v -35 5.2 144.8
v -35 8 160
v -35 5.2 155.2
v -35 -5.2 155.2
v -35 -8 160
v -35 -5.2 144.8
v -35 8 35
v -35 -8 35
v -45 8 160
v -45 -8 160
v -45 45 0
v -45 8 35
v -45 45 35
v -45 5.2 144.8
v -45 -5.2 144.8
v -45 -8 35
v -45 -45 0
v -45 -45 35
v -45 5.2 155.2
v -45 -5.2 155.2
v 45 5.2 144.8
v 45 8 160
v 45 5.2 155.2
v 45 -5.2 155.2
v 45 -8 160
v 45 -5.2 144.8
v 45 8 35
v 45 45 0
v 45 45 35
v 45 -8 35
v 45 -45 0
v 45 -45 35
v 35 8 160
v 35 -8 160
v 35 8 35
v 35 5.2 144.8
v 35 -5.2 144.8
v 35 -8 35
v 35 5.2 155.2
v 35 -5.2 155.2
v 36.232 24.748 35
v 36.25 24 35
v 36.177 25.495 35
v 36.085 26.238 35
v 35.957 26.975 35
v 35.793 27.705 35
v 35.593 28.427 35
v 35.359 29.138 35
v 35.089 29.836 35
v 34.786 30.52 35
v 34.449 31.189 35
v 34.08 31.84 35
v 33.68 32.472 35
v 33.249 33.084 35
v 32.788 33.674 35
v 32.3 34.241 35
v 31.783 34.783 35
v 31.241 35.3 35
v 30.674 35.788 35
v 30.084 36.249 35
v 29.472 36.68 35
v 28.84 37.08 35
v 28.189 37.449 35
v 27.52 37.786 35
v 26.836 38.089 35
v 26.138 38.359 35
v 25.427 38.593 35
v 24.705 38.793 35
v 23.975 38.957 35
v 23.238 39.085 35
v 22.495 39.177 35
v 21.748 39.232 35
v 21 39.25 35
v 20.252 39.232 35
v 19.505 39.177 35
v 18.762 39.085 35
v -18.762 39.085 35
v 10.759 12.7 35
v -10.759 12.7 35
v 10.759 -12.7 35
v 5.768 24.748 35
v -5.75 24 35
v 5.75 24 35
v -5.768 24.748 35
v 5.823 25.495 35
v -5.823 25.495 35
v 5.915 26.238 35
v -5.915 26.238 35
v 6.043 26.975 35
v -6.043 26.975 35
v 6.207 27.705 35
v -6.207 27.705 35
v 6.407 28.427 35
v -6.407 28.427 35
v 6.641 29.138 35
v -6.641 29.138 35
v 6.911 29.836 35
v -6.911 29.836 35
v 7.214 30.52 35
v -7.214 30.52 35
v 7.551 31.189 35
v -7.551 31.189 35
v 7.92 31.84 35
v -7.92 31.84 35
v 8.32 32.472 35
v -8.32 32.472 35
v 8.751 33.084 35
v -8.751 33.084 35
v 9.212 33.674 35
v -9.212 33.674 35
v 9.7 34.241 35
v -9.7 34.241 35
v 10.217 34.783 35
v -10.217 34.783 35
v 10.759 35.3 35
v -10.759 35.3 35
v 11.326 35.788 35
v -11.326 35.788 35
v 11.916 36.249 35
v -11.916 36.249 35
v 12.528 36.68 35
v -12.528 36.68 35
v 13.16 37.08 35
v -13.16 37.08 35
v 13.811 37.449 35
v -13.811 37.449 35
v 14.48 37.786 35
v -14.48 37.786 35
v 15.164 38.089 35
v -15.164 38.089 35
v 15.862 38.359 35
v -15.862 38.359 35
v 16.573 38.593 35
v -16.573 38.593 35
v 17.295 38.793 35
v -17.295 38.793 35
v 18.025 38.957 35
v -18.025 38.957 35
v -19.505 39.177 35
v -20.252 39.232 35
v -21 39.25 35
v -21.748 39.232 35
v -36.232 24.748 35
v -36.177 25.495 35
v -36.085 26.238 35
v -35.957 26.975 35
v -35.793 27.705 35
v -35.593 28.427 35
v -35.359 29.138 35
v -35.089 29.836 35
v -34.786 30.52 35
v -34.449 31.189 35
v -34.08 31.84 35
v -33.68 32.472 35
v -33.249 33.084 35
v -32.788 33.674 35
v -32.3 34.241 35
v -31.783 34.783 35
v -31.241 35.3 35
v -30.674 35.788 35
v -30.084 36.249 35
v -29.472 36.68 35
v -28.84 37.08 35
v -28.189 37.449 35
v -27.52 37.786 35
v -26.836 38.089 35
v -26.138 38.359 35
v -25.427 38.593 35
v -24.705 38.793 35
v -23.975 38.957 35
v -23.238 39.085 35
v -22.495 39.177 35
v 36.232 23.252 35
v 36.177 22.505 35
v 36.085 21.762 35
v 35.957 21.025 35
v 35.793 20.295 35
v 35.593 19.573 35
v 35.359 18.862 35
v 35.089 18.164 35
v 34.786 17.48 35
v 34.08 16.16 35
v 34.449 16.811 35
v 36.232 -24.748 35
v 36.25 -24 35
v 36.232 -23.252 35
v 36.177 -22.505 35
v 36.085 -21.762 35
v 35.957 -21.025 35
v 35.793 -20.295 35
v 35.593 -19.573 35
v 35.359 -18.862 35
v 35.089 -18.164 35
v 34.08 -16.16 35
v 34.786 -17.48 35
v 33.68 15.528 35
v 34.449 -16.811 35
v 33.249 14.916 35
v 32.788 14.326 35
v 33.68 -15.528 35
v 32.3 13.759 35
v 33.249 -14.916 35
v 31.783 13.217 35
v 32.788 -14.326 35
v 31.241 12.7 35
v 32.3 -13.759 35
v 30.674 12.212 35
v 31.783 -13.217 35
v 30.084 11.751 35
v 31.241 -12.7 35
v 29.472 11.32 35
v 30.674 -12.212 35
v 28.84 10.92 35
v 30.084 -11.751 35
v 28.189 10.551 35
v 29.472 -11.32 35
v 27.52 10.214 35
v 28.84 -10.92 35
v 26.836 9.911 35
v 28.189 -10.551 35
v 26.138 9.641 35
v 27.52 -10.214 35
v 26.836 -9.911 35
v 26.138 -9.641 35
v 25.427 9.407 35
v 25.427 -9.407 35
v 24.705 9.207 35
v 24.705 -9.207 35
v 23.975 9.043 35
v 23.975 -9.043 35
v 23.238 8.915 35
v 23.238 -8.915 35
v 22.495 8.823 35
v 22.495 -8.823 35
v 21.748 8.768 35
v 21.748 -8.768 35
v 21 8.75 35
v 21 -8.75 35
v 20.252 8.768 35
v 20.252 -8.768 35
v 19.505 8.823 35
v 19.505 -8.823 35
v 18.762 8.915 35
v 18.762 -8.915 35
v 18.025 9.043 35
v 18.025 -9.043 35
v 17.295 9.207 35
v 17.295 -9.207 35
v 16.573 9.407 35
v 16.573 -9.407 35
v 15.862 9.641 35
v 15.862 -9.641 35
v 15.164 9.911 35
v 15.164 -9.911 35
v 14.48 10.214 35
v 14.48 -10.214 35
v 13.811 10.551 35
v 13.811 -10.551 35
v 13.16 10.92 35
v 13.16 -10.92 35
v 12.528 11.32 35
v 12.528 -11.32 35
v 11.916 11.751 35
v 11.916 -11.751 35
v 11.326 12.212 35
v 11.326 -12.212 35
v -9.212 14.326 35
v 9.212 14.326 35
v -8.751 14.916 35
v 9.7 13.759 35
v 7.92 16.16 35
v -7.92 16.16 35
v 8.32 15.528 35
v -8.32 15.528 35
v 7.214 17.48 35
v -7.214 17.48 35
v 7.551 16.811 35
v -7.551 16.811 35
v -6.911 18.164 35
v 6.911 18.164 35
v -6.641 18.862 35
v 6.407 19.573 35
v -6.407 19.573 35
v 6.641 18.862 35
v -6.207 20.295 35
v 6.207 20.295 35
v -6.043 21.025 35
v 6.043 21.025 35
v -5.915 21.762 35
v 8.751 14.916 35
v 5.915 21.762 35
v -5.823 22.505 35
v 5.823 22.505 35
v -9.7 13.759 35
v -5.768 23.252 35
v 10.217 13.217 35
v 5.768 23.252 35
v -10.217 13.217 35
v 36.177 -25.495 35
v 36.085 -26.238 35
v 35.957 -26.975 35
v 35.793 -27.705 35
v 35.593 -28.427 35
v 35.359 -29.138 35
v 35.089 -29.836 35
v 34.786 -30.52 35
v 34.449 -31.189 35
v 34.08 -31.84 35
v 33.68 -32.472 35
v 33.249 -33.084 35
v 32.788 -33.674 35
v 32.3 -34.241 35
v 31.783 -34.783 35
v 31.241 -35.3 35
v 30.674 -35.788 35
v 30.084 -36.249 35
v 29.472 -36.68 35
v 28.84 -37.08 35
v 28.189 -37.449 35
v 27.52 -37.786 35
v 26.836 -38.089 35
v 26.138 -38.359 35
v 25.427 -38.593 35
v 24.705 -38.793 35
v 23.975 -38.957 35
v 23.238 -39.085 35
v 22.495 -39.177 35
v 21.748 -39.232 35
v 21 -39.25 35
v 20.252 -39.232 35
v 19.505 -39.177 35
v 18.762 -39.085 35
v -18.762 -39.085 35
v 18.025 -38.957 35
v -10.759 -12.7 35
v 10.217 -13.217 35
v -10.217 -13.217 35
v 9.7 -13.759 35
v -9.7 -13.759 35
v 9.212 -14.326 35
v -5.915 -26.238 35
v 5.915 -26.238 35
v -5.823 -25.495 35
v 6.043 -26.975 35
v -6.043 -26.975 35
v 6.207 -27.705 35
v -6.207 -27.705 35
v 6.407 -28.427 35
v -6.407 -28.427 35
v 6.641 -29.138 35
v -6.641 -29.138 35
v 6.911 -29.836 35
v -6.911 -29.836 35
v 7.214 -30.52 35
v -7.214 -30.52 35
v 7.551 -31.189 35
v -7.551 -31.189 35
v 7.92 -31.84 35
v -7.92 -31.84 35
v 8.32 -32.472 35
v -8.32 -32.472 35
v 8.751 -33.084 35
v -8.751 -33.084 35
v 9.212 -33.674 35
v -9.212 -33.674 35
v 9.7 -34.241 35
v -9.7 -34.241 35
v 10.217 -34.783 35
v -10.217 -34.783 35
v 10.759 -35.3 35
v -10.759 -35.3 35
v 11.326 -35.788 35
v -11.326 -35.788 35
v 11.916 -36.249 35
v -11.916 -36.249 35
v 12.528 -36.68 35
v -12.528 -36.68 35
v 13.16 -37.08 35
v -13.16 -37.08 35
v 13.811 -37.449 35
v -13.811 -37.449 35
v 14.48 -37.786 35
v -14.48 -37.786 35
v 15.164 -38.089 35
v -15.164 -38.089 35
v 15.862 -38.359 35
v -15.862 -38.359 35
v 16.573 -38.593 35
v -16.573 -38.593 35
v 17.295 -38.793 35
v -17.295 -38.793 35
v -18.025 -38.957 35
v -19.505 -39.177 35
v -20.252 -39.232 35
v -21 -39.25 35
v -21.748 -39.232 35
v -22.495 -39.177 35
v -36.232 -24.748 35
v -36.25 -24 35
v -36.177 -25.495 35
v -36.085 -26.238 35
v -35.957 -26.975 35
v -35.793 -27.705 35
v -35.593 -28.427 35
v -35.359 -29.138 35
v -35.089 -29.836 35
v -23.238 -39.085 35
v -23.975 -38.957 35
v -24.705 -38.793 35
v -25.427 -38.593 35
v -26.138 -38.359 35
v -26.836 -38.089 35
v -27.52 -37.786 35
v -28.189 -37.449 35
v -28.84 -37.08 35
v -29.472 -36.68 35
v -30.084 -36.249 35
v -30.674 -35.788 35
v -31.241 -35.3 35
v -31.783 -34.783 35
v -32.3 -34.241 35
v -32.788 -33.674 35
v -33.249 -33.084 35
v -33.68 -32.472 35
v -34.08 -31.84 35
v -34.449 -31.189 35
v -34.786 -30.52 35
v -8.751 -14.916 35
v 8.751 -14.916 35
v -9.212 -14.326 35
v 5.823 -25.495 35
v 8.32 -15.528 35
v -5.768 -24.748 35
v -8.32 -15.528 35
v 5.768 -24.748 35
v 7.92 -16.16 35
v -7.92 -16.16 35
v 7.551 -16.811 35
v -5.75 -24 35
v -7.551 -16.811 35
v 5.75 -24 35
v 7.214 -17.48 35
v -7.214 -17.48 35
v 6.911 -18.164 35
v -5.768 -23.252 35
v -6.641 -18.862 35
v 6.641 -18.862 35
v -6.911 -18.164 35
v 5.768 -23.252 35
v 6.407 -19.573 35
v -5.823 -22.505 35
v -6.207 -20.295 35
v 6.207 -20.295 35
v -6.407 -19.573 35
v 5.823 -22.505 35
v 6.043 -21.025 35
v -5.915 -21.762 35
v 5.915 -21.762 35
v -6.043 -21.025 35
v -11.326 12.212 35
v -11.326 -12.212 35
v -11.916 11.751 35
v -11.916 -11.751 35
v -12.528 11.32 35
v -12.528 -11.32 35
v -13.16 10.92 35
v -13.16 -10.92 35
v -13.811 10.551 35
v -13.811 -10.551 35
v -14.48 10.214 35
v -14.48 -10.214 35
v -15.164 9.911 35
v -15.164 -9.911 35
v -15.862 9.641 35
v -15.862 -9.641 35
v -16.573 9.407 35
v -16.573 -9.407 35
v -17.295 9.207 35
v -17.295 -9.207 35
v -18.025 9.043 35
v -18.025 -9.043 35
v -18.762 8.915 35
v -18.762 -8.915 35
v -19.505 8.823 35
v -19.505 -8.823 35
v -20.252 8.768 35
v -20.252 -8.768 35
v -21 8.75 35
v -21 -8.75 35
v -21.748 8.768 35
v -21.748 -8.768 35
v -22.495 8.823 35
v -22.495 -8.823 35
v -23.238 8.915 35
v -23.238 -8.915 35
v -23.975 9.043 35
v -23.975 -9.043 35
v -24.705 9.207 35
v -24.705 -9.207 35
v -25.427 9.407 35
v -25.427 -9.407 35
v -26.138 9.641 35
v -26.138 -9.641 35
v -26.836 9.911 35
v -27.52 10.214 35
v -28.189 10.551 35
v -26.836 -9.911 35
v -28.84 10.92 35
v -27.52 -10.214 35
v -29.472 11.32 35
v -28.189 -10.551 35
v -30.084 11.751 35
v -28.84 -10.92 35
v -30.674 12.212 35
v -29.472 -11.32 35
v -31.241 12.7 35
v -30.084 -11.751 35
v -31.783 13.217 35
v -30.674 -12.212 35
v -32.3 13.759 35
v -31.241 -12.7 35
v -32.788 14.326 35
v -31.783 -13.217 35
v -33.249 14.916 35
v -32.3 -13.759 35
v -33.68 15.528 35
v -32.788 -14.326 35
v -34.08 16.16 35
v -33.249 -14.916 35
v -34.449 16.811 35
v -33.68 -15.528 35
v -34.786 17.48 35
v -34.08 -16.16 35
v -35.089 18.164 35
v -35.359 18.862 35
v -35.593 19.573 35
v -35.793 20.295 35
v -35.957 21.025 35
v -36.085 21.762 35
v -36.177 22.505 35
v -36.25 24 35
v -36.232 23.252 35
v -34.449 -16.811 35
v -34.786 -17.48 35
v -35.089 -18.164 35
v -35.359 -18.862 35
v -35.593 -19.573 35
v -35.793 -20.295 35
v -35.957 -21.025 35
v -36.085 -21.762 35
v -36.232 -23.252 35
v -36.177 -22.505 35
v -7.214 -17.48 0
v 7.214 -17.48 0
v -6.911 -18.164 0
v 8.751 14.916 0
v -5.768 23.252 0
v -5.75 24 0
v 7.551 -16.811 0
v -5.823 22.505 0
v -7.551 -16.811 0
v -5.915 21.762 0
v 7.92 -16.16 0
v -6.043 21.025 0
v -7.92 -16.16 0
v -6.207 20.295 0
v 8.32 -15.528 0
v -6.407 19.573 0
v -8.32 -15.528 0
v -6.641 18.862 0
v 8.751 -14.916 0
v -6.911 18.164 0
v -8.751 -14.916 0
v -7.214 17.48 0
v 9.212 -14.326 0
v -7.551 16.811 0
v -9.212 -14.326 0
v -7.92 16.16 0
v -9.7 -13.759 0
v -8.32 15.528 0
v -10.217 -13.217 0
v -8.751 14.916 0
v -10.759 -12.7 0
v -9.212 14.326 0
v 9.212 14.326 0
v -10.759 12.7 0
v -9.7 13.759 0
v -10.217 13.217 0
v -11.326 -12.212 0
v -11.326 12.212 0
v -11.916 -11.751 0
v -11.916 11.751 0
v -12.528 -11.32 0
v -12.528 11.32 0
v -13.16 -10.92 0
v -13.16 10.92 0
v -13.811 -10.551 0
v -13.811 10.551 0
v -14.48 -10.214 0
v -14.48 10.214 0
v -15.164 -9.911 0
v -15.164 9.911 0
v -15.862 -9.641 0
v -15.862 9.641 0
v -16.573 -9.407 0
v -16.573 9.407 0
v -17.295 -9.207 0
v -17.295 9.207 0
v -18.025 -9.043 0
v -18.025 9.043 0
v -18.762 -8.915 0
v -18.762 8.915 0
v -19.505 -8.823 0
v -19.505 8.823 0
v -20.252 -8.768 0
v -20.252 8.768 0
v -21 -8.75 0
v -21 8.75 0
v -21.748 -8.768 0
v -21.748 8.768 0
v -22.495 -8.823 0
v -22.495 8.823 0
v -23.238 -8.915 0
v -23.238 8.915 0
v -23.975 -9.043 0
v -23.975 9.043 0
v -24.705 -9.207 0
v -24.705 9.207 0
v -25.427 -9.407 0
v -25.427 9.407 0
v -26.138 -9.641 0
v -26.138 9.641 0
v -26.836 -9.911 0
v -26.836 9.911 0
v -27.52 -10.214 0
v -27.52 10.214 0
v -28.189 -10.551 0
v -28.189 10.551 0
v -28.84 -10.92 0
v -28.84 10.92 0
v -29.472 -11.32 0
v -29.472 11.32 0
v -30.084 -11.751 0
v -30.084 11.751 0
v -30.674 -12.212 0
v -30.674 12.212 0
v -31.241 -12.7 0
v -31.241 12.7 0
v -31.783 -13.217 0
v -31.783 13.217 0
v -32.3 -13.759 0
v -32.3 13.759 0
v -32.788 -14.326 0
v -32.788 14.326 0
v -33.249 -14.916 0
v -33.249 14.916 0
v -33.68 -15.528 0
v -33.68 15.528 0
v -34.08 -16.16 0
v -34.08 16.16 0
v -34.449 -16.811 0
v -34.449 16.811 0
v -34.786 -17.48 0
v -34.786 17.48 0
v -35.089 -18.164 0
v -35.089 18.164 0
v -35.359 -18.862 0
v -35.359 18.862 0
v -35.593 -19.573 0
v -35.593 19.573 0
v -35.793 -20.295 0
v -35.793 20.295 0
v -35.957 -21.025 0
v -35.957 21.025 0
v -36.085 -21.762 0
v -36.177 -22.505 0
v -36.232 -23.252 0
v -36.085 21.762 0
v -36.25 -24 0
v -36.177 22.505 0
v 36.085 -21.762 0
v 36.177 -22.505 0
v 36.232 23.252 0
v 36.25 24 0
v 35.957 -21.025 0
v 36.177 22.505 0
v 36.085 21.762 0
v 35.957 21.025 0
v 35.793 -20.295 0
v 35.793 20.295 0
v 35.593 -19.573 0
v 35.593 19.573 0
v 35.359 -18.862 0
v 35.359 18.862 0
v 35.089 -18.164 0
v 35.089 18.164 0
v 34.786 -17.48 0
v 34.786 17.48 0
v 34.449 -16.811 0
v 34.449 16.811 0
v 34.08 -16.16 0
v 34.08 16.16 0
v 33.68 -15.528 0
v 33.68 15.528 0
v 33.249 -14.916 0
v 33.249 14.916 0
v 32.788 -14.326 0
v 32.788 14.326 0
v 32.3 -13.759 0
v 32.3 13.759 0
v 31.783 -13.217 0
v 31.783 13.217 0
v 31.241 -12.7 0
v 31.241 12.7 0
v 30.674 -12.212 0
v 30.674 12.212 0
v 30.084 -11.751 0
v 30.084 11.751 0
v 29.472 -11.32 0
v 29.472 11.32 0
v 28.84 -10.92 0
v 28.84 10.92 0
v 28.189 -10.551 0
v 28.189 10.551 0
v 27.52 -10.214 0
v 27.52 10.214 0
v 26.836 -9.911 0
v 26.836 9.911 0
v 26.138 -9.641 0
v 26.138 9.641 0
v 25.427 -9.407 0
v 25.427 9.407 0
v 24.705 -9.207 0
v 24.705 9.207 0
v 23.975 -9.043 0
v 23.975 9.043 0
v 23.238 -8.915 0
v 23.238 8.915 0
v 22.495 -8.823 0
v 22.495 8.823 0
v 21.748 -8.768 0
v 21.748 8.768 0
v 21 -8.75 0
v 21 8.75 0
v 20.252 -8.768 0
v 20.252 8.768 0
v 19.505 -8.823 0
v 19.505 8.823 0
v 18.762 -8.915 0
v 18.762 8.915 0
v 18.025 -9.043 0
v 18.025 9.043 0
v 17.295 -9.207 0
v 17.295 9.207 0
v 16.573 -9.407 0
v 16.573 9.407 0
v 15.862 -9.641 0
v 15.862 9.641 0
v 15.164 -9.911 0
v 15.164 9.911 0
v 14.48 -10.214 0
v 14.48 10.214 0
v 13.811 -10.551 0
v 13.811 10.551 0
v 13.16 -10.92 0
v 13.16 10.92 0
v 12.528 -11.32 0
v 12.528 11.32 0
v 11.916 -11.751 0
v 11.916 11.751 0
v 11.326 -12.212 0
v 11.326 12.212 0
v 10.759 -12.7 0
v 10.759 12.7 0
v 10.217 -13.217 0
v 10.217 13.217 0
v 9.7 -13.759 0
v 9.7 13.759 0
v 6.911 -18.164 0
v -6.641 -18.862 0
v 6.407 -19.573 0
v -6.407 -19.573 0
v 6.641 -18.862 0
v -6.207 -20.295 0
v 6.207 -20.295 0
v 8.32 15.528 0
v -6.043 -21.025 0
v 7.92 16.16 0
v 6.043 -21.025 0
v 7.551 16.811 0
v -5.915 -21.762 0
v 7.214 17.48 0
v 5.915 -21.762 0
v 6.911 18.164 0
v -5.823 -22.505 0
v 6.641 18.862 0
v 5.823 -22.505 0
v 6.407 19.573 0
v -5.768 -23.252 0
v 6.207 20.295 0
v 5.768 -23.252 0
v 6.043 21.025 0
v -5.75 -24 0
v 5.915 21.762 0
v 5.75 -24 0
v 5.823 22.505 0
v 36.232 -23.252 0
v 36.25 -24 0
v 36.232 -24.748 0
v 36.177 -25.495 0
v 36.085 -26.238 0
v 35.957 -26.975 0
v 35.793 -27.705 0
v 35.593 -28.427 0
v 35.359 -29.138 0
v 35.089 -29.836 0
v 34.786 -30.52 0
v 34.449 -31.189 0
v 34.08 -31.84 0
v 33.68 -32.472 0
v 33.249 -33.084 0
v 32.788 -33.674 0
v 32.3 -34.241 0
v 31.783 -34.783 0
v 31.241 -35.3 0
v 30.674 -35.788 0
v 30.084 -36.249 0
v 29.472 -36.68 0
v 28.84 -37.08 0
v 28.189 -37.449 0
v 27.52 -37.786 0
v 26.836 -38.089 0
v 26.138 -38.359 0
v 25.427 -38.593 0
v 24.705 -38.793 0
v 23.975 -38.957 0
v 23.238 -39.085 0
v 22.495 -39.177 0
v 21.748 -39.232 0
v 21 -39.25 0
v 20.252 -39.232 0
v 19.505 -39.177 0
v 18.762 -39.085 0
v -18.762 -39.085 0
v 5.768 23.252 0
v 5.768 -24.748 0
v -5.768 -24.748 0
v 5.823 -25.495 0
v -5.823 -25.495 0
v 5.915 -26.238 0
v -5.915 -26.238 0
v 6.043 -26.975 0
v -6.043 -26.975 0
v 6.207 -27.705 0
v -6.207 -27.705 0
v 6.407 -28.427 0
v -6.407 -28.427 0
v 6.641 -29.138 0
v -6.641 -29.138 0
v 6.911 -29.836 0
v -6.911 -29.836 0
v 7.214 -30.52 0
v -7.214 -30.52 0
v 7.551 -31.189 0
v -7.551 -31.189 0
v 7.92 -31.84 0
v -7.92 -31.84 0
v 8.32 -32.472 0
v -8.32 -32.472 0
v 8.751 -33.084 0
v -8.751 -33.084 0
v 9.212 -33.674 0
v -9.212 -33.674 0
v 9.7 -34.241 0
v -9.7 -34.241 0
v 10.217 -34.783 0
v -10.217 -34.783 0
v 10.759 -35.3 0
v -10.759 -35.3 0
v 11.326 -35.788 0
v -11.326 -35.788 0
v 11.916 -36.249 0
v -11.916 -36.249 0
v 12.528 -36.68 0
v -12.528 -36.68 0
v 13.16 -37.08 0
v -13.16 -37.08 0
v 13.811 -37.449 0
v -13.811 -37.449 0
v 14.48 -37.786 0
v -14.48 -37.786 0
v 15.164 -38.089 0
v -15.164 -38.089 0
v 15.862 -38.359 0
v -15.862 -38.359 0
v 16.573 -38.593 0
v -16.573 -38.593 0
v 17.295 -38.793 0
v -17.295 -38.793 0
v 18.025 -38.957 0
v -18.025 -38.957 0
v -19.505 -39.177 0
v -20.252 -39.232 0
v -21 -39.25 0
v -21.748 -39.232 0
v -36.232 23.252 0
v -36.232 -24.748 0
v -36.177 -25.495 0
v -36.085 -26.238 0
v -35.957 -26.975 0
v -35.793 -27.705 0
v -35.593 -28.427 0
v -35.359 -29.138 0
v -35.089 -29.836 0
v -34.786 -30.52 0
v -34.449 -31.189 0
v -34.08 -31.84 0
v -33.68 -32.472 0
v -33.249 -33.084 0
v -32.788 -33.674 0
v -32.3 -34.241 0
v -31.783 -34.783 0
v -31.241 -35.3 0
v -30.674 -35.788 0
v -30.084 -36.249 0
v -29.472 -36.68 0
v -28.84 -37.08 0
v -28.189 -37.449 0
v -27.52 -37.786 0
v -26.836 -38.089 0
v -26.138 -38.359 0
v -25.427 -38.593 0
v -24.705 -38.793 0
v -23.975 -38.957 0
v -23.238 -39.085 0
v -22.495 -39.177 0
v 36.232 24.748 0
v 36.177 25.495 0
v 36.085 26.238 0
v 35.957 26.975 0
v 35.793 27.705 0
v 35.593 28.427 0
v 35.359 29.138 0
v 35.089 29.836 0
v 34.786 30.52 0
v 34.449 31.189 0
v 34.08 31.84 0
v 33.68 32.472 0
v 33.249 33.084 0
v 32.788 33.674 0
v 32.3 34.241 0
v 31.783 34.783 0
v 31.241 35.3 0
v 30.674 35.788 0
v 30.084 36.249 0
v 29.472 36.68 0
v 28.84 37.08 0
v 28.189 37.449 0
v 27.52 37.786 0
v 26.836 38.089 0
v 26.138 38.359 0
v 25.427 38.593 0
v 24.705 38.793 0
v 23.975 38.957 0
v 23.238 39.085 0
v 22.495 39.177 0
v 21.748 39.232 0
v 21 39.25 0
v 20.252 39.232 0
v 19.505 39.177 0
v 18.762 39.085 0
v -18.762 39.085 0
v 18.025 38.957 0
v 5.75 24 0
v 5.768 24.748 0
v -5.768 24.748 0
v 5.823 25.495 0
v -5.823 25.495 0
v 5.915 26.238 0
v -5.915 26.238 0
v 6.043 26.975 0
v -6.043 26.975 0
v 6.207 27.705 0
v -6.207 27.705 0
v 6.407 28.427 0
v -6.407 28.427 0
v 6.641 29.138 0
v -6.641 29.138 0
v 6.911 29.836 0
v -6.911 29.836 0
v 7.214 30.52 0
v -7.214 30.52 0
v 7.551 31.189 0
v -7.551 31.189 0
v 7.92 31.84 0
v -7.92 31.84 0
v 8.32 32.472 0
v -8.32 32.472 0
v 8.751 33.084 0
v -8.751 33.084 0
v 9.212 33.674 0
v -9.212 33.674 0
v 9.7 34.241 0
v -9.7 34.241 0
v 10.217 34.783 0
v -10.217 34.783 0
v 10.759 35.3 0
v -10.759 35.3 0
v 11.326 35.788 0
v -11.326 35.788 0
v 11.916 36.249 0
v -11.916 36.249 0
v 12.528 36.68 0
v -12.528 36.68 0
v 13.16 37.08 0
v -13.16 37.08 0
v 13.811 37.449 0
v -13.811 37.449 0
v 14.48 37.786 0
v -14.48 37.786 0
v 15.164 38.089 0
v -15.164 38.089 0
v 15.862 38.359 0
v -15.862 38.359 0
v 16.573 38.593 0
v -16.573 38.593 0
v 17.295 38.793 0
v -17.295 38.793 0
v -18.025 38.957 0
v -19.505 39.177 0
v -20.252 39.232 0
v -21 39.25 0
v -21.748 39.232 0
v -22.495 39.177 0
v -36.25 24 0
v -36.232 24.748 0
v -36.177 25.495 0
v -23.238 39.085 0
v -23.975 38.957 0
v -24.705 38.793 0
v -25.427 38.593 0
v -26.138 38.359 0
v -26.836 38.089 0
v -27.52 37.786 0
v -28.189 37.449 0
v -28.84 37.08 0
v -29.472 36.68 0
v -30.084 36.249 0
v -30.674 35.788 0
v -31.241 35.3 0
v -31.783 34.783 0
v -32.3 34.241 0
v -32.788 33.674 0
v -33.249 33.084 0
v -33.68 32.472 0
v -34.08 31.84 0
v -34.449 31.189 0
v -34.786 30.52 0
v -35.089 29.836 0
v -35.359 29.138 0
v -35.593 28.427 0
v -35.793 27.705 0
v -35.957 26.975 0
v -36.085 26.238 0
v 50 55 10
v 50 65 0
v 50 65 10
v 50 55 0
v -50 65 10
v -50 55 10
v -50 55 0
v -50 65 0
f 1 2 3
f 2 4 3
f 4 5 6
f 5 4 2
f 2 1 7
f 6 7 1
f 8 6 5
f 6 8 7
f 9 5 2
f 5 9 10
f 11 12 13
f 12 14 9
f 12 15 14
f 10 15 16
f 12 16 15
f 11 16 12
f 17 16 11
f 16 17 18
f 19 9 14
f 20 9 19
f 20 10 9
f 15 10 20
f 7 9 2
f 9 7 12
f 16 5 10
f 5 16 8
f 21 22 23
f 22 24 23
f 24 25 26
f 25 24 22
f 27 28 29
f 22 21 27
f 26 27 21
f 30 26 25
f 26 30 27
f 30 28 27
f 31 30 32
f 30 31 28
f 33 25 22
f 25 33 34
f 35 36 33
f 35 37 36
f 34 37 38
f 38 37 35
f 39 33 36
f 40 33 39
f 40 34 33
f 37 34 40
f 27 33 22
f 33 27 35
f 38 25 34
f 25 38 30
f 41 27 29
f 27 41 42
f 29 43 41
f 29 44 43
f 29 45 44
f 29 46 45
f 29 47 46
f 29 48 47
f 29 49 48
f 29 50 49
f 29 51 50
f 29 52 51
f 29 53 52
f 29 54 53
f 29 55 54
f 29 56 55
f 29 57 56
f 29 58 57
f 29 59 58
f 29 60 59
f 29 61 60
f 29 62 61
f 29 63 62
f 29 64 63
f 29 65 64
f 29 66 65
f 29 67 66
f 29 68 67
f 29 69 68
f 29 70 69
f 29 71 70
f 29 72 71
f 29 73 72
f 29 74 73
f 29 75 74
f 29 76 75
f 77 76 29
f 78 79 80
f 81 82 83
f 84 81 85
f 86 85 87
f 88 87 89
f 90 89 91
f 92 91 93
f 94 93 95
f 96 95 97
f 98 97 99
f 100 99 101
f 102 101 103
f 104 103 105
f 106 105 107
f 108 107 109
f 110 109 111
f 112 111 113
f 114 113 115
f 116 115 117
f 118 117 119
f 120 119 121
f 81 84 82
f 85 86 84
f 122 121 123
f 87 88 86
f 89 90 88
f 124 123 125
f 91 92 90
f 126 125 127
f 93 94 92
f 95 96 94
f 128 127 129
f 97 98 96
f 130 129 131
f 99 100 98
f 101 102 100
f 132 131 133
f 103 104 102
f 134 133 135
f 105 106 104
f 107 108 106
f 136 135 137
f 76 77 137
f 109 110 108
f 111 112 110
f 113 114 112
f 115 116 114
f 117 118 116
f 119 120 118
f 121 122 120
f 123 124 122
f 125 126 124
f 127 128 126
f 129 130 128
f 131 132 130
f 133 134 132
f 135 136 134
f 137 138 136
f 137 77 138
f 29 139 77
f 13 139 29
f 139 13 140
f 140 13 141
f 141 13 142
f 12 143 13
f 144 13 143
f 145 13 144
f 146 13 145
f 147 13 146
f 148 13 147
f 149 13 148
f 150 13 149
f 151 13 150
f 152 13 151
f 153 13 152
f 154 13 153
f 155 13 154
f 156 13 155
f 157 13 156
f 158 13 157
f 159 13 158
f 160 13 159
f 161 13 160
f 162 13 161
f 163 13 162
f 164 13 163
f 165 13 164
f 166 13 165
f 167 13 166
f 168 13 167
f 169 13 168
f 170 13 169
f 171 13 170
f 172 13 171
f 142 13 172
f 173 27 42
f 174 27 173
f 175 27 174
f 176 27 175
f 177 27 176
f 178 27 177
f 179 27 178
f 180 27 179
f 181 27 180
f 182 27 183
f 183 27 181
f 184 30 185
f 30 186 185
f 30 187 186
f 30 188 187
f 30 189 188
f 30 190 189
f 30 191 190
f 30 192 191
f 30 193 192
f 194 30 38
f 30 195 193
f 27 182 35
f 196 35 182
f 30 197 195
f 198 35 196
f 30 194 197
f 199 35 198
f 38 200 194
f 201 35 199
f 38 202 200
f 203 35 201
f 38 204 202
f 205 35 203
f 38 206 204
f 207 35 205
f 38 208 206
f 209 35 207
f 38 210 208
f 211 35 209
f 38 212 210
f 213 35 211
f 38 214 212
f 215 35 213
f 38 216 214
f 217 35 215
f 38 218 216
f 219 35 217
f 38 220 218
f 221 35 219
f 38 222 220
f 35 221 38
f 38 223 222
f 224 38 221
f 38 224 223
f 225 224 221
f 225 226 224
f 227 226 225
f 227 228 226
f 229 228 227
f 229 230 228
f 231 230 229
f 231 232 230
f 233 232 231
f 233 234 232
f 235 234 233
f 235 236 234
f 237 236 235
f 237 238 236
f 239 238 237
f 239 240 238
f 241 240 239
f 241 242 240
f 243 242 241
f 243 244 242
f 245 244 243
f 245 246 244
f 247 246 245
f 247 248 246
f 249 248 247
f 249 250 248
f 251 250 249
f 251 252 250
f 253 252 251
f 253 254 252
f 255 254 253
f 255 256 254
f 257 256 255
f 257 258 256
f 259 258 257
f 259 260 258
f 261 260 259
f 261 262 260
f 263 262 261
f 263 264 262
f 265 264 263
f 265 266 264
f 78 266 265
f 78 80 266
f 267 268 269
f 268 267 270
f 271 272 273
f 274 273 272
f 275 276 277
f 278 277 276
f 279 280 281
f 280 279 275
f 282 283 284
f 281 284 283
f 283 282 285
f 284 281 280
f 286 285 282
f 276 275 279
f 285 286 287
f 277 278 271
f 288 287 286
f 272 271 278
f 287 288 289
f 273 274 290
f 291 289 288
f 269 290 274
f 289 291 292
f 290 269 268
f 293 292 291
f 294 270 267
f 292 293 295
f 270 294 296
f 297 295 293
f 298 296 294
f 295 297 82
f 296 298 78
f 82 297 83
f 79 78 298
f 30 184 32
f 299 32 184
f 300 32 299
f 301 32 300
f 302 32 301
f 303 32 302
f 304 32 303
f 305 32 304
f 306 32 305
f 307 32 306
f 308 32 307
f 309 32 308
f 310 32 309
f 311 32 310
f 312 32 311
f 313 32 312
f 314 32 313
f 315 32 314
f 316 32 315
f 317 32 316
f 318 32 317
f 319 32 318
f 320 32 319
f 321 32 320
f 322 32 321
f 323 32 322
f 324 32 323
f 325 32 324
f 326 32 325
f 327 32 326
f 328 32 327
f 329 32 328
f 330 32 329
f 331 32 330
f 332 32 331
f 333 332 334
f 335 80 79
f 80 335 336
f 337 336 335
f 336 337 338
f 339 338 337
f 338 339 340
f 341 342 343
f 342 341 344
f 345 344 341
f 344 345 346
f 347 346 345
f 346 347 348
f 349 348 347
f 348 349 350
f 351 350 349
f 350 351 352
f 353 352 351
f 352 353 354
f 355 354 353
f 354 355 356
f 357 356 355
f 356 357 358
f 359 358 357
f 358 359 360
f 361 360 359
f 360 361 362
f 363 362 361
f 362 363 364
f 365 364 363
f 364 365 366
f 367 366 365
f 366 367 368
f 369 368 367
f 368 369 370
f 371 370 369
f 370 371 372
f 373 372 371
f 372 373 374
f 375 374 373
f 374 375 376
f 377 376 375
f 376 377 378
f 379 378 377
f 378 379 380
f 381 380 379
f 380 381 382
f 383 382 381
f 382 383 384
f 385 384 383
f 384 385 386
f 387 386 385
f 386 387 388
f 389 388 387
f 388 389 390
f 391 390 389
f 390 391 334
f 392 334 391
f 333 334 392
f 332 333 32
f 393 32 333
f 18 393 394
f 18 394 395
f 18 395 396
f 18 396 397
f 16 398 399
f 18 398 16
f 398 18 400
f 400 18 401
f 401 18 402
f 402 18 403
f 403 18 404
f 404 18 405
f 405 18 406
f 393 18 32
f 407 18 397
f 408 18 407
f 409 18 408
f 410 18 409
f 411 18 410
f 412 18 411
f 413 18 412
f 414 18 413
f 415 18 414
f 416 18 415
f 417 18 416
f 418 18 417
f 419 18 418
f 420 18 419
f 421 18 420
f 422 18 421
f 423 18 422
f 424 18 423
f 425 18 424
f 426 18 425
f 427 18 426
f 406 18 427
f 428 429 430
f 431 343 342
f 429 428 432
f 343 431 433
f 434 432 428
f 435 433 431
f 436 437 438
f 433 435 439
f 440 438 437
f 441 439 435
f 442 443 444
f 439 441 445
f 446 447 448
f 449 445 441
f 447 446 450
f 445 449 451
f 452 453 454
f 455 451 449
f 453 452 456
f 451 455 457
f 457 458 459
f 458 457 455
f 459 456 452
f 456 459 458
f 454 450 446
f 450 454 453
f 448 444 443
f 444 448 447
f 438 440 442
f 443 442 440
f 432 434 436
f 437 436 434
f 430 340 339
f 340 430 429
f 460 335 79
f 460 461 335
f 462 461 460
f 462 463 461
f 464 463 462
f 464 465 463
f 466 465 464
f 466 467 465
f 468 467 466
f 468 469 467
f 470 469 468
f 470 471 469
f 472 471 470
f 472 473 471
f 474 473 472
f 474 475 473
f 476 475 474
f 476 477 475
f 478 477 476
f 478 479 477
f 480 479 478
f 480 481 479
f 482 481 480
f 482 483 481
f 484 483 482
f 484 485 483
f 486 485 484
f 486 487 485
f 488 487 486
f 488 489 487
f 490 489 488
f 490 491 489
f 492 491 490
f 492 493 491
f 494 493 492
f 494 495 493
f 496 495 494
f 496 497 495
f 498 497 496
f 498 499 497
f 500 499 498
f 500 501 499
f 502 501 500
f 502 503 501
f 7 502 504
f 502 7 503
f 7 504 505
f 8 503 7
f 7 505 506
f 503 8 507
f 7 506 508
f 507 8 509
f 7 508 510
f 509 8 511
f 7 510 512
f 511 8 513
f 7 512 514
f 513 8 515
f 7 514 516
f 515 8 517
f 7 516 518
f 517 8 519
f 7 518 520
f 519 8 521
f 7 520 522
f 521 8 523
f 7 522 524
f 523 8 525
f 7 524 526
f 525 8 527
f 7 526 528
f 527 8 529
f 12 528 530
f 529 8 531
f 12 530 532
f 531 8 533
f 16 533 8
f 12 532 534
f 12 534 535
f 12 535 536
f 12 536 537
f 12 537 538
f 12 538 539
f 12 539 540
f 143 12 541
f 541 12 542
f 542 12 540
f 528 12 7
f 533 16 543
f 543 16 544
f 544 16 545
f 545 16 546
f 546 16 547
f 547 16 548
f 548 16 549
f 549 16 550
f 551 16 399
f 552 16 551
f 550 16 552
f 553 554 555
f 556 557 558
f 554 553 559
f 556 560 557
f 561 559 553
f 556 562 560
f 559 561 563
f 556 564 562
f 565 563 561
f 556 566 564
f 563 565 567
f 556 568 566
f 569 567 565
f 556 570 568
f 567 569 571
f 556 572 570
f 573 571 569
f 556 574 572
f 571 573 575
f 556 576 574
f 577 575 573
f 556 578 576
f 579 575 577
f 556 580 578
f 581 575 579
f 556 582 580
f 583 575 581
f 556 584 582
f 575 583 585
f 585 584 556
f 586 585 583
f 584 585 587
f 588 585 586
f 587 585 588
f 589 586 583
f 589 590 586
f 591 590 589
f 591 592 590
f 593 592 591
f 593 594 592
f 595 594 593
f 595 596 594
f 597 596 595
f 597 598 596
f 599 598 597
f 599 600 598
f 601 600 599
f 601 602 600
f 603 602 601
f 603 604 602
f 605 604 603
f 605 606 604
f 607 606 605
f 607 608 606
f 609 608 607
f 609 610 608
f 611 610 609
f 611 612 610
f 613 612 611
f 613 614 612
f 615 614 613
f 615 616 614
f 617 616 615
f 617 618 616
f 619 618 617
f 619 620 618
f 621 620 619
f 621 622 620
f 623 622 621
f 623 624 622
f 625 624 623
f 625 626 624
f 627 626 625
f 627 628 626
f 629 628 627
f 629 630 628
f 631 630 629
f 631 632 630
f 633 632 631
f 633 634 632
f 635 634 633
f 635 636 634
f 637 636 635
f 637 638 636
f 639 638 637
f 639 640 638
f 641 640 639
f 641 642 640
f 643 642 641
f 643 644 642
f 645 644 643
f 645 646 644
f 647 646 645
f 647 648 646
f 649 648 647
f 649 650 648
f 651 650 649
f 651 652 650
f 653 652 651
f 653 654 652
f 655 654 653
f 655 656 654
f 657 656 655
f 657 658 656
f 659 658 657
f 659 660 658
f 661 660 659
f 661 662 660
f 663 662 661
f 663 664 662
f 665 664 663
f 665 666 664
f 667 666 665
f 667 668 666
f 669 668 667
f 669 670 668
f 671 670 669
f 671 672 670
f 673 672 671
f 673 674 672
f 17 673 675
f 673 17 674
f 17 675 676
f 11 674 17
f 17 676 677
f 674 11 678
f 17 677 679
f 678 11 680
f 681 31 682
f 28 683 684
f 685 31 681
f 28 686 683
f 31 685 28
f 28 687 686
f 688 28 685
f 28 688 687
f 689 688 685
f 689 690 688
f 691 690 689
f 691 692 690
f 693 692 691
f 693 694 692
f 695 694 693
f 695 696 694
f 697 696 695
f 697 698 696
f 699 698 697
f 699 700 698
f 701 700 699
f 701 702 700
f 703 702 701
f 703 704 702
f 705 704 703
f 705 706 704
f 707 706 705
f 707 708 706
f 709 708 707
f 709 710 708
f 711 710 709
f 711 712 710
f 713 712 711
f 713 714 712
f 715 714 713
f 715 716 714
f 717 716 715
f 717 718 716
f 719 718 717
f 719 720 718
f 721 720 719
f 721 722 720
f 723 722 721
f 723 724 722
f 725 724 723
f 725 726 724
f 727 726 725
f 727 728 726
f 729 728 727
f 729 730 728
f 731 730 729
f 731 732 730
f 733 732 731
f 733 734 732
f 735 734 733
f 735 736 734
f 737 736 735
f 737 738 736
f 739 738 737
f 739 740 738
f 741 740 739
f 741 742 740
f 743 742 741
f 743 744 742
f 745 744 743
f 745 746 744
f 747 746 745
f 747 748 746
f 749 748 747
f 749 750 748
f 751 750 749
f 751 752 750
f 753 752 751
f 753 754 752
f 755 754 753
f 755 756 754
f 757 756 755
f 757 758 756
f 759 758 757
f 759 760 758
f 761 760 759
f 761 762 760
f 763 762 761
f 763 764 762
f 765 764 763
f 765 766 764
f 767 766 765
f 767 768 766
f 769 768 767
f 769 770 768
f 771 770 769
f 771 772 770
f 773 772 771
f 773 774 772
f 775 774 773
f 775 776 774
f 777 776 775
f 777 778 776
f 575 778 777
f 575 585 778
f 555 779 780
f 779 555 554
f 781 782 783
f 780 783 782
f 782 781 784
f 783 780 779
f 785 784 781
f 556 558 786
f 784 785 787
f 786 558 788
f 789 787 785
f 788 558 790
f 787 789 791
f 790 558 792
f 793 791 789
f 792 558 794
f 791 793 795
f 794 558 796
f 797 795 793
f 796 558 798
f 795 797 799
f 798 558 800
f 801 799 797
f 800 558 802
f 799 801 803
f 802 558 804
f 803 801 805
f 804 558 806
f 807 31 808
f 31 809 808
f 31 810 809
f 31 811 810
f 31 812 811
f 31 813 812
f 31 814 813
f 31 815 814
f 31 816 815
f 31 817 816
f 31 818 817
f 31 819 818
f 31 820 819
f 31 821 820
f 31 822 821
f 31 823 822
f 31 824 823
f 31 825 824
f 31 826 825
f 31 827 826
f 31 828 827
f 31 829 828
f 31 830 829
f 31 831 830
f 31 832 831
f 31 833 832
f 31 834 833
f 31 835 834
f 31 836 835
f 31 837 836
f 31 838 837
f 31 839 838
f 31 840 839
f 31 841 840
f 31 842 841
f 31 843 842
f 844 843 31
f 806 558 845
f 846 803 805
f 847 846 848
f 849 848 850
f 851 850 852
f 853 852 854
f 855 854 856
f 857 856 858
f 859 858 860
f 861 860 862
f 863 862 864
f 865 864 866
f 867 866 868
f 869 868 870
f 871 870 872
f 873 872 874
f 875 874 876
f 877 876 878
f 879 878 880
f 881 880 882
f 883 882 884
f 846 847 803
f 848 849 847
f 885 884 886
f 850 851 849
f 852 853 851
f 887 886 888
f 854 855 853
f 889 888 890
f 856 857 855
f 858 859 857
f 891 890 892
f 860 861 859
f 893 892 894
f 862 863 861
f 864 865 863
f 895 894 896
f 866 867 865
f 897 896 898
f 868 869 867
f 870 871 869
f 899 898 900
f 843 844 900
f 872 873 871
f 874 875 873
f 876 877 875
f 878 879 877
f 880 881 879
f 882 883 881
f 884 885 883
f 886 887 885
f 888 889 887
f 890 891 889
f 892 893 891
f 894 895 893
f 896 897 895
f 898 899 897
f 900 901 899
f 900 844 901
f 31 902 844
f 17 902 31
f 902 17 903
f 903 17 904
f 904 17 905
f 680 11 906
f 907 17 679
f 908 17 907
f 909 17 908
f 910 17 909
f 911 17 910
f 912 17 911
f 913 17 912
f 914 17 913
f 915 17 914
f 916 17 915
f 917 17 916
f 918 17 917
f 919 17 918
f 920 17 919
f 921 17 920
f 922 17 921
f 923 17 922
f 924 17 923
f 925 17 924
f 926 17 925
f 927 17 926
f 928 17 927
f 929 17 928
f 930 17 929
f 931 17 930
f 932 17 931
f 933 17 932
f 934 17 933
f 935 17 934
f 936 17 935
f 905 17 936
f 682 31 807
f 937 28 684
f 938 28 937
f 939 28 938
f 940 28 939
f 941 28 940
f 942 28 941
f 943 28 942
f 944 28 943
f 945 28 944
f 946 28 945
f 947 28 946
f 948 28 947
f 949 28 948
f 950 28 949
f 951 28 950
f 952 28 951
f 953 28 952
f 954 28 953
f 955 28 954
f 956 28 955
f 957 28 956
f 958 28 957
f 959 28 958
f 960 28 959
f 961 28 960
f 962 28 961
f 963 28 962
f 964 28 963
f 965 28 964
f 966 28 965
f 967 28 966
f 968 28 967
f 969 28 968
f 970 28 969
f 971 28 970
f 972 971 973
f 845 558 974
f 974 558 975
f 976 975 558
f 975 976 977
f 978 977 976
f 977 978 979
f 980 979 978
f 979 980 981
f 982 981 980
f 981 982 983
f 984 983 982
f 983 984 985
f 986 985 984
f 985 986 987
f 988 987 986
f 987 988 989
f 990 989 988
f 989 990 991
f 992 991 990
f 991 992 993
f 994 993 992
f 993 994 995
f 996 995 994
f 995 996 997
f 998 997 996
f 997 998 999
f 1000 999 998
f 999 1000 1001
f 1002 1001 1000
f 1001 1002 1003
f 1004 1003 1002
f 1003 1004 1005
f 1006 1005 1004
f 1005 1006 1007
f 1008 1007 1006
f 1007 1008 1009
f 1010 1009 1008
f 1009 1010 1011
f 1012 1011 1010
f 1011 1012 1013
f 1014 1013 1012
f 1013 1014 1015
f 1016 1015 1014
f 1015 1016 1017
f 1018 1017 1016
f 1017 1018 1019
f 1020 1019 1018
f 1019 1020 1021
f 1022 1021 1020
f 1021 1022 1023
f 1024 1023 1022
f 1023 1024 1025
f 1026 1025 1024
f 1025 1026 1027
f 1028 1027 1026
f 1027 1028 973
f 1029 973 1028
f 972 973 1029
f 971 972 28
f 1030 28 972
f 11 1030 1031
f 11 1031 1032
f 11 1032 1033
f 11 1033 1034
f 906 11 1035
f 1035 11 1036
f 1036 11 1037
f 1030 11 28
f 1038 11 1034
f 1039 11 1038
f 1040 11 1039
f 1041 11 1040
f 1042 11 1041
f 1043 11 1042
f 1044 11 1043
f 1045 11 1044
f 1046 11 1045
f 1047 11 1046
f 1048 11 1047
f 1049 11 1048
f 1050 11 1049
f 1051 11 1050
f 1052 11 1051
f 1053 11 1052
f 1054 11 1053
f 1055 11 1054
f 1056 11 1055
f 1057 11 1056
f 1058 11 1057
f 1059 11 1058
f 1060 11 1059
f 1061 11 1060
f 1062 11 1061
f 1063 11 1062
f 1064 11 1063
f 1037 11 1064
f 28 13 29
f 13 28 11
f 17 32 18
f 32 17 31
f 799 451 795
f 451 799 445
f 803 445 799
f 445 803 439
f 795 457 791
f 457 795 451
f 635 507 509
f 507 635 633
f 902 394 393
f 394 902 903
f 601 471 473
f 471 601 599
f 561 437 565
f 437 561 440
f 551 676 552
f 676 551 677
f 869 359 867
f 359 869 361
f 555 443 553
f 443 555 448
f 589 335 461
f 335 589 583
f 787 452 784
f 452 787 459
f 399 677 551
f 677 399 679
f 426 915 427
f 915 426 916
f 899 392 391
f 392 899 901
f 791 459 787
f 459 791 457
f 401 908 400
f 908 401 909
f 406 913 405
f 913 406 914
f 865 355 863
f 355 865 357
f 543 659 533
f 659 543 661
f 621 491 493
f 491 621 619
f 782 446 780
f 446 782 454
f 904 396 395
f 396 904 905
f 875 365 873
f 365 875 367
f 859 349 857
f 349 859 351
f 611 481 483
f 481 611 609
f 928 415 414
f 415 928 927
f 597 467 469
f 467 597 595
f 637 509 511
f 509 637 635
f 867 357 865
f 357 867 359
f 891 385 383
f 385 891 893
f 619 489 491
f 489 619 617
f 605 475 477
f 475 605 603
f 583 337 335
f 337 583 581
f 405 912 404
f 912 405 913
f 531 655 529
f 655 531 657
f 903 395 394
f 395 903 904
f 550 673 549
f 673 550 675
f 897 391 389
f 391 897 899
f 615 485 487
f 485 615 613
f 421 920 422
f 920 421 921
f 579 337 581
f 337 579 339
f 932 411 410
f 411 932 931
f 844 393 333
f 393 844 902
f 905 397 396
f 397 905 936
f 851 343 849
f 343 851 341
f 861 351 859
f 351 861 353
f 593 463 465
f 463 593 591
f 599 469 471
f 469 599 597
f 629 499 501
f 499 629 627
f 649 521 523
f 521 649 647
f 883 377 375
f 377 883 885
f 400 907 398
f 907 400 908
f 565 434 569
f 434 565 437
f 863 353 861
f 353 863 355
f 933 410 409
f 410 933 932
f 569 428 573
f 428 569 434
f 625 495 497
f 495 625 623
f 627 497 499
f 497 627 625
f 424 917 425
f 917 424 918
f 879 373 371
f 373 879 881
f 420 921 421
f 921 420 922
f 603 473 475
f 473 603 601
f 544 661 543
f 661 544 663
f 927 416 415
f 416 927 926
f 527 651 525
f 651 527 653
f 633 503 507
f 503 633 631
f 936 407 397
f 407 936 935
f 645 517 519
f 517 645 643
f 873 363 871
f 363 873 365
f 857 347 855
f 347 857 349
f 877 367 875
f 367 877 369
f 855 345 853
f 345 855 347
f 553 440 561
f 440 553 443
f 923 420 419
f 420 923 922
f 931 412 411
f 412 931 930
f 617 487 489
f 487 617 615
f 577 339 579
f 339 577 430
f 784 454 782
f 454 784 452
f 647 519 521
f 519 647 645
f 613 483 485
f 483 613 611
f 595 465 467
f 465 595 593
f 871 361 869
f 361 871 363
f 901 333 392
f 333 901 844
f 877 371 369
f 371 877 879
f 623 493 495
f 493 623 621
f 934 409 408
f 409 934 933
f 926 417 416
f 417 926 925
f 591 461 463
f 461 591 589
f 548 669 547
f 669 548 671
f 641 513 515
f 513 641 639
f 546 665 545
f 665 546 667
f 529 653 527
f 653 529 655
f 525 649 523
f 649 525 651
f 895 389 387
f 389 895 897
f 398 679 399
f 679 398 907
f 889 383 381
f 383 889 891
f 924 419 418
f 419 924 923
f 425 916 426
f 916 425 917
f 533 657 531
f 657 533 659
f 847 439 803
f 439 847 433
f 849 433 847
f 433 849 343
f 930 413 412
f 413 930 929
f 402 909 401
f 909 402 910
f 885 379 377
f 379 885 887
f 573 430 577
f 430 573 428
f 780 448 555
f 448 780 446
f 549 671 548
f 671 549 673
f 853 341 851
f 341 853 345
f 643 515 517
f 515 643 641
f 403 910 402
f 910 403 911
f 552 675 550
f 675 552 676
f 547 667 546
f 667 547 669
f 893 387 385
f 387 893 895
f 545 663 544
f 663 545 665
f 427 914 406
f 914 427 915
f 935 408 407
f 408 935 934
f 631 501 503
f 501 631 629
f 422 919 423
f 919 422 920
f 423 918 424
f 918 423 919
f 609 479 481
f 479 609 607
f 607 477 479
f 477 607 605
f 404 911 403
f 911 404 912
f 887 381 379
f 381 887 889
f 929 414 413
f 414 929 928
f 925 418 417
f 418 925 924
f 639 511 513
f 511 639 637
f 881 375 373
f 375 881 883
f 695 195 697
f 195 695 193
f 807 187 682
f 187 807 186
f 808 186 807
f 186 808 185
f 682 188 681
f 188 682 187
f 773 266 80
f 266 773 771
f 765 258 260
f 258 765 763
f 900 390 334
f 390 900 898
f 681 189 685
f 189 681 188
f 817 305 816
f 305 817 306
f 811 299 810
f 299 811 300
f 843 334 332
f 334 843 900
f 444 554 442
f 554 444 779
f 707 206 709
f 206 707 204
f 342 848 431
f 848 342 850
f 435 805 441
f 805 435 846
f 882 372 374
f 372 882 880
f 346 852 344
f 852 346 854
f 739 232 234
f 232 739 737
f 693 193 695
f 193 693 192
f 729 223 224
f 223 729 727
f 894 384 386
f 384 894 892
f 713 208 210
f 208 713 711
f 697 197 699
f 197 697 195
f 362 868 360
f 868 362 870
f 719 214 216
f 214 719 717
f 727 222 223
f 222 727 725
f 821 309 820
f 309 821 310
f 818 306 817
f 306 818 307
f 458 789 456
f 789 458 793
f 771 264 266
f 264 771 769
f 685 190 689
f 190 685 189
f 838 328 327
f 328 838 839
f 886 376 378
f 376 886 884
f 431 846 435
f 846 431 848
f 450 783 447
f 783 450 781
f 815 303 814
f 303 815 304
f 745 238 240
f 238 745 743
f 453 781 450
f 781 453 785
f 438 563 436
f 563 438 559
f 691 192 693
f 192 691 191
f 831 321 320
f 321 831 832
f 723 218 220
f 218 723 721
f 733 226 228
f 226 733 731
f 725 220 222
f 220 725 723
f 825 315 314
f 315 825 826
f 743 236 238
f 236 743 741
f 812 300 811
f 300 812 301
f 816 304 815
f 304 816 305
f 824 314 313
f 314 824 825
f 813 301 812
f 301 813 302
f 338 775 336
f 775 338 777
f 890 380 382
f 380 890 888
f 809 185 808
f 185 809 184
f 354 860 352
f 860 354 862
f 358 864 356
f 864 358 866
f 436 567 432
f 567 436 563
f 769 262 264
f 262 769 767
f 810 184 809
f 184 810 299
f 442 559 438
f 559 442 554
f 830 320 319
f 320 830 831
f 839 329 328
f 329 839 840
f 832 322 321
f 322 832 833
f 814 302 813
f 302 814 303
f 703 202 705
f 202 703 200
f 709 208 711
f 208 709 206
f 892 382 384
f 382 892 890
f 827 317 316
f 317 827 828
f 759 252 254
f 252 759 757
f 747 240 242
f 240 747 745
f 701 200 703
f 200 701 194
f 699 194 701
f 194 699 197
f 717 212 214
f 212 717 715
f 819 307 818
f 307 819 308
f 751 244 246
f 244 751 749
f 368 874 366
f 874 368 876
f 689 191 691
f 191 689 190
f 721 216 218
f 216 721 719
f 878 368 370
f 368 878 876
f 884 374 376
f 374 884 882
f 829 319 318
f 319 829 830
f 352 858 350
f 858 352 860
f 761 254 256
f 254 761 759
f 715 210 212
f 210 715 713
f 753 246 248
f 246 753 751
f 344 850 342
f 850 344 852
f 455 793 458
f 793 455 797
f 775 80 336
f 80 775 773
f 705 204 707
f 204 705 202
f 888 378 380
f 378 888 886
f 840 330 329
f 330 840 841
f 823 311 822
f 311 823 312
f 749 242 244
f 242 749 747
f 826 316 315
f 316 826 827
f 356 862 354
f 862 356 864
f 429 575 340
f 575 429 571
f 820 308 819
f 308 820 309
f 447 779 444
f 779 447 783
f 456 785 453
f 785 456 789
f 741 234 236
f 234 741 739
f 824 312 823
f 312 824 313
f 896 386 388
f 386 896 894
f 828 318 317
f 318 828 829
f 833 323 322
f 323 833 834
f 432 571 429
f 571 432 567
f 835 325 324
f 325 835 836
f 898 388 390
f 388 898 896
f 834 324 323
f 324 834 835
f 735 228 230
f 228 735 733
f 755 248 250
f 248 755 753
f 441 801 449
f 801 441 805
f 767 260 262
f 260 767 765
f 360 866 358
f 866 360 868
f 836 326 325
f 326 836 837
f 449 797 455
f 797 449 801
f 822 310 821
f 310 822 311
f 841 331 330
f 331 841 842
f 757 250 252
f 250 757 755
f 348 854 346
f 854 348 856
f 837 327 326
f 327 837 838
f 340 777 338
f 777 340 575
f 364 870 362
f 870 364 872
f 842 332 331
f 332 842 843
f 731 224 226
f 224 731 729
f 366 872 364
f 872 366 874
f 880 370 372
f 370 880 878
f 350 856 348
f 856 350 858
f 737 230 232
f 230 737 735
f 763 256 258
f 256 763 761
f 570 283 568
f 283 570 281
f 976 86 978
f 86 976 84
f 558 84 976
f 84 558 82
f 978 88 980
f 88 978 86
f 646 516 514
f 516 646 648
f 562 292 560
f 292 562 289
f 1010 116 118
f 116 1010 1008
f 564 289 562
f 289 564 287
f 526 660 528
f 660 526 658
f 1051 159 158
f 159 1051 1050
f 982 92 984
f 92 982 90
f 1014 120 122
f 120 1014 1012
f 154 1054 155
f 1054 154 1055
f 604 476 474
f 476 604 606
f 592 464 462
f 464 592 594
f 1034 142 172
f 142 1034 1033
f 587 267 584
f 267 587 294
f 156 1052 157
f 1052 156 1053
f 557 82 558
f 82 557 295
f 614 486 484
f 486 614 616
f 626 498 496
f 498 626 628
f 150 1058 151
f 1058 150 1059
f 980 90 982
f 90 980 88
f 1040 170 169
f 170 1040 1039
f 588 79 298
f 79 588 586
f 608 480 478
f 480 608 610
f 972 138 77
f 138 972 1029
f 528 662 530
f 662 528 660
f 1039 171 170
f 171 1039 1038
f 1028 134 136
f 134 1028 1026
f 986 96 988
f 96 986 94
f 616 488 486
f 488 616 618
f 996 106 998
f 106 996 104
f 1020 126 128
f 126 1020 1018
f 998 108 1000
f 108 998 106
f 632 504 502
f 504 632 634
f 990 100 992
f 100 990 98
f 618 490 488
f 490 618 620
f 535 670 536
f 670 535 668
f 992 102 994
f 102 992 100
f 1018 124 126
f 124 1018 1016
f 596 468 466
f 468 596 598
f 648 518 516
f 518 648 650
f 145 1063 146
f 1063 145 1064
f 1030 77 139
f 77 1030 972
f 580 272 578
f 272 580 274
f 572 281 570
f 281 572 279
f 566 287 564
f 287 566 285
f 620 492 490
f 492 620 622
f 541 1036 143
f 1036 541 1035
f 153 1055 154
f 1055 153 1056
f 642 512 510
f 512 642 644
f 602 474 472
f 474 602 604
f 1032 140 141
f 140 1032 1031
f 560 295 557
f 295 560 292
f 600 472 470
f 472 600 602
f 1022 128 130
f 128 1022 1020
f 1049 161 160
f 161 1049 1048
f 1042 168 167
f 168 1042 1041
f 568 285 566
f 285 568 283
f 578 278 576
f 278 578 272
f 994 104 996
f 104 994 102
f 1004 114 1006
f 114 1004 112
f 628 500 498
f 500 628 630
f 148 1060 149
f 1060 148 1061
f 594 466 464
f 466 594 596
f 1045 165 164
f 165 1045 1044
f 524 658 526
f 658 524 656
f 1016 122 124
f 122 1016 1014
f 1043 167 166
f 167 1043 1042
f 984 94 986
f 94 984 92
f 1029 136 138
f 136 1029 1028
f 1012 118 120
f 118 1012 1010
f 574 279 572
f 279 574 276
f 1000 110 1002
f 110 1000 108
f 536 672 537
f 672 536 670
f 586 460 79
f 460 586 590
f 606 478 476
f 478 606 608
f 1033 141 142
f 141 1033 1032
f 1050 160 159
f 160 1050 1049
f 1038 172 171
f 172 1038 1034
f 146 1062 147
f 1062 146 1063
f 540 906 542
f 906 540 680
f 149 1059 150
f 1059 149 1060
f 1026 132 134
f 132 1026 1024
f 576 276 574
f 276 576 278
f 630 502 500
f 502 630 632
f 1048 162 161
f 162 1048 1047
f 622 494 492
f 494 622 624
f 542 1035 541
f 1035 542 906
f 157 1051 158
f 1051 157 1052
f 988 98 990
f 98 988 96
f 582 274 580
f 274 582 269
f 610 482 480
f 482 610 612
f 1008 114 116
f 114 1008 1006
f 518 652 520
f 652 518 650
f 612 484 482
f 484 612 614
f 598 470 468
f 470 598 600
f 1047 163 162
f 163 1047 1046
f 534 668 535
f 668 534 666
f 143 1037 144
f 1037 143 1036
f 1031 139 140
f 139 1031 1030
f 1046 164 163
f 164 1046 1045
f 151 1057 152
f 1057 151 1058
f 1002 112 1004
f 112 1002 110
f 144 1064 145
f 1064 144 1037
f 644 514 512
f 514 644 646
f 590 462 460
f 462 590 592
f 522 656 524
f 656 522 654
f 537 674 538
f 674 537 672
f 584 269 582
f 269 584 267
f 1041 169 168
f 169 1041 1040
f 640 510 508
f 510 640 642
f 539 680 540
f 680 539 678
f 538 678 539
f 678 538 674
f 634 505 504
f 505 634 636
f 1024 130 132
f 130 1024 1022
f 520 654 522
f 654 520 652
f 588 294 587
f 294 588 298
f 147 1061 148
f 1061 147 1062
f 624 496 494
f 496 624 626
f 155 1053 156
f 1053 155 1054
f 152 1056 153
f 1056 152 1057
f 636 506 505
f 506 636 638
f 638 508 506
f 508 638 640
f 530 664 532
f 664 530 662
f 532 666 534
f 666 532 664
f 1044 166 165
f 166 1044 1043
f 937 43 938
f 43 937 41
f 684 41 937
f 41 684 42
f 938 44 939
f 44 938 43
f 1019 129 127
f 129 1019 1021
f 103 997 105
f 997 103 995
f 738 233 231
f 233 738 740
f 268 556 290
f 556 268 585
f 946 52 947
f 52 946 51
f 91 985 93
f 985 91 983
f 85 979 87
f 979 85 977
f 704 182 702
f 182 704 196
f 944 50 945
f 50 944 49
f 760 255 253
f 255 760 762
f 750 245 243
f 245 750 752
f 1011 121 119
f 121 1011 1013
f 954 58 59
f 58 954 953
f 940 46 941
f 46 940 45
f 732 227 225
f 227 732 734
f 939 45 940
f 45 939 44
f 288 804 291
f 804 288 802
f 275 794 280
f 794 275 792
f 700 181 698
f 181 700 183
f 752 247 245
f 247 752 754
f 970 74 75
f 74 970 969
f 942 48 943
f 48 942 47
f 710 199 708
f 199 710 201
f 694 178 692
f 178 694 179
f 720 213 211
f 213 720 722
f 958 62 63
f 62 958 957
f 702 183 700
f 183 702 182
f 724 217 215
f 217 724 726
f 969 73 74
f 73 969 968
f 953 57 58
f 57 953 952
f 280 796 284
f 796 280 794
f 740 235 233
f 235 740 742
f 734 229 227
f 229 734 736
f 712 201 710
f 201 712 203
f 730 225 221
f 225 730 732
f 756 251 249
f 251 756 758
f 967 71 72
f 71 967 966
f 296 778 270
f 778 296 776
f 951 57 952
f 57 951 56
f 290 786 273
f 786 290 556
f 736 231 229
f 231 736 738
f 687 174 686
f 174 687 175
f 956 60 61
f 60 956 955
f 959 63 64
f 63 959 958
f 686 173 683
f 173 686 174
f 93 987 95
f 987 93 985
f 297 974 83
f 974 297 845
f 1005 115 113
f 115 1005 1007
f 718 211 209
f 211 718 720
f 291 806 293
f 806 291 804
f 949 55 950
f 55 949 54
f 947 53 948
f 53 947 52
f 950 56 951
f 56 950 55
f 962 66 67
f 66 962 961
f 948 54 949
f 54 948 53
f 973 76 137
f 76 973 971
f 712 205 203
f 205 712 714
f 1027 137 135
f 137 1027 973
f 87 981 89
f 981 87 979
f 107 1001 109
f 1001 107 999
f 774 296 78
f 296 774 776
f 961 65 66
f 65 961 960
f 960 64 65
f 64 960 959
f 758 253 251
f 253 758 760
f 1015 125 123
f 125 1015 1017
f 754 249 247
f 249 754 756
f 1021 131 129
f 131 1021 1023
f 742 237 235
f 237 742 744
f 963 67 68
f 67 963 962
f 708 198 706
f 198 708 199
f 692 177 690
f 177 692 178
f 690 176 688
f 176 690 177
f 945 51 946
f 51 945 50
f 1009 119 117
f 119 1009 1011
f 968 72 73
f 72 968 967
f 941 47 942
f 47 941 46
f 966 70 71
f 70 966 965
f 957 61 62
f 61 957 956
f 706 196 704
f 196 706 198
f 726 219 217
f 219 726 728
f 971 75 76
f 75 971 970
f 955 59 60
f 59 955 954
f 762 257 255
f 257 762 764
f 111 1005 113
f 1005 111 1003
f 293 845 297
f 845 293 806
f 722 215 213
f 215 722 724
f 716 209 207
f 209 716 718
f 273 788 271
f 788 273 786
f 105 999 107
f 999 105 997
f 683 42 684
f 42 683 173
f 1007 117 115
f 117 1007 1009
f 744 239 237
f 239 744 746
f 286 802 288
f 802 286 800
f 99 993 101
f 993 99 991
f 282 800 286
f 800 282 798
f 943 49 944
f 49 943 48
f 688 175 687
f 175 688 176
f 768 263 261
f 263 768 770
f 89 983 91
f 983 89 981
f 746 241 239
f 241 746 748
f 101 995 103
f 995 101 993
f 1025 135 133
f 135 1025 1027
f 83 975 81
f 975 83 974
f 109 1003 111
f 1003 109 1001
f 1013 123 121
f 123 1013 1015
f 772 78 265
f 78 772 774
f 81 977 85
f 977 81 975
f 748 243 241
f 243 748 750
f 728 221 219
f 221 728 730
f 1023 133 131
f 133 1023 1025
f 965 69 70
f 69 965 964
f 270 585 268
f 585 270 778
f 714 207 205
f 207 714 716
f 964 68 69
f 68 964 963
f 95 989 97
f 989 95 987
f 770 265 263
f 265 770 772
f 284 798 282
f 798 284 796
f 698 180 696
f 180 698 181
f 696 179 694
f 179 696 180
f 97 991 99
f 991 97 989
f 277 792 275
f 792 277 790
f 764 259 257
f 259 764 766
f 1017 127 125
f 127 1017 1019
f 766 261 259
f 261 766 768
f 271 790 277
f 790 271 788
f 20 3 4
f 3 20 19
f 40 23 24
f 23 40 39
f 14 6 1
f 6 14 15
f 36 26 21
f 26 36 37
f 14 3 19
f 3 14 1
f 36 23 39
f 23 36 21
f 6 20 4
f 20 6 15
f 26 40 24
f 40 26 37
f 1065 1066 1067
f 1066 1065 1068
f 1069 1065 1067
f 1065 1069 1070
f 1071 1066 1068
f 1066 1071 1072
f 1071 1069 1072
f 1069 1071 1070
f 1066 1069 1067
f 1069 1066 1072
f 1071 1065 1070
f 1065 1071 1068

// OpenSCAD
// KNOWN-WRONG PART (must fail): the seats go right through the base (no floor)
// Carrier for four 50 mL conical tubes with a carrying handle; two parts printed side by side
// Category: hardware. Part 1: a base block with four blind seats and two posts with square holes
// near the top. Part 2: a square handle bar, printed lying flat, pushed through both posts.
// Print: PETG, 0.2 mm layers, 4 perimeters; the posts are tall, so print slowly near the top.
// A drop of glue (or a tight fit) keeps the bar in place.
// SPDX-License-Identifier: CERN-OHL-P-2.0

/* [Carrier] */
base = [90, 90, 35];      // X, Y, Z [mm], centred on the origin
seat_d = 30.5;            // 50 mL conical tube is ~29-30 mm across
seat_depth = 36;          // 5 mm floor
seat_pos = [[-21, -24], [21, -24], [-21, 24], [21, 24]];
post = [10, 16];          // post X, Y; flush with the X end faces, centred on y = 0
post_top = 160;
hole = 10.4;              // square hole along X for the handle bar
hole_z = 150;
bar = [100, 10, 10];      // handle bar X, Y, Z
bar_gap = 10;             // gap between the bar and the base's +Y face

/* [Hidden] */
eps = 0.01;

// part 1: carrier
difference() {
    union() {
        translate([-base.x / 2, -base.y / 2, 0]) cube(base);
        for (s = [-1, 1])
            translate([s > 0 ? base.x / 2 - post.x : -base.x / 2, -post.y / 2, base.z - eps])
                cube([post.x, post.y, post_top - base.z + eps]);
    }
    for (p = seat_pos)
        translate([p.x, p.y, base.z - seat_depth]) cylinder(d = seat_d, h = seat_depth + 2, $fn = 128);
    translate([-base.x / 2 - 1, -hole / 2, hole_z - hole / 2]) cube([base.x + 2, hole, hole]);
}
// part 2: handle bar, beside the base on the +Y side
translate([-bar.x / 2, base.y / 2 + bar_gap, 0]) cube(bar);
